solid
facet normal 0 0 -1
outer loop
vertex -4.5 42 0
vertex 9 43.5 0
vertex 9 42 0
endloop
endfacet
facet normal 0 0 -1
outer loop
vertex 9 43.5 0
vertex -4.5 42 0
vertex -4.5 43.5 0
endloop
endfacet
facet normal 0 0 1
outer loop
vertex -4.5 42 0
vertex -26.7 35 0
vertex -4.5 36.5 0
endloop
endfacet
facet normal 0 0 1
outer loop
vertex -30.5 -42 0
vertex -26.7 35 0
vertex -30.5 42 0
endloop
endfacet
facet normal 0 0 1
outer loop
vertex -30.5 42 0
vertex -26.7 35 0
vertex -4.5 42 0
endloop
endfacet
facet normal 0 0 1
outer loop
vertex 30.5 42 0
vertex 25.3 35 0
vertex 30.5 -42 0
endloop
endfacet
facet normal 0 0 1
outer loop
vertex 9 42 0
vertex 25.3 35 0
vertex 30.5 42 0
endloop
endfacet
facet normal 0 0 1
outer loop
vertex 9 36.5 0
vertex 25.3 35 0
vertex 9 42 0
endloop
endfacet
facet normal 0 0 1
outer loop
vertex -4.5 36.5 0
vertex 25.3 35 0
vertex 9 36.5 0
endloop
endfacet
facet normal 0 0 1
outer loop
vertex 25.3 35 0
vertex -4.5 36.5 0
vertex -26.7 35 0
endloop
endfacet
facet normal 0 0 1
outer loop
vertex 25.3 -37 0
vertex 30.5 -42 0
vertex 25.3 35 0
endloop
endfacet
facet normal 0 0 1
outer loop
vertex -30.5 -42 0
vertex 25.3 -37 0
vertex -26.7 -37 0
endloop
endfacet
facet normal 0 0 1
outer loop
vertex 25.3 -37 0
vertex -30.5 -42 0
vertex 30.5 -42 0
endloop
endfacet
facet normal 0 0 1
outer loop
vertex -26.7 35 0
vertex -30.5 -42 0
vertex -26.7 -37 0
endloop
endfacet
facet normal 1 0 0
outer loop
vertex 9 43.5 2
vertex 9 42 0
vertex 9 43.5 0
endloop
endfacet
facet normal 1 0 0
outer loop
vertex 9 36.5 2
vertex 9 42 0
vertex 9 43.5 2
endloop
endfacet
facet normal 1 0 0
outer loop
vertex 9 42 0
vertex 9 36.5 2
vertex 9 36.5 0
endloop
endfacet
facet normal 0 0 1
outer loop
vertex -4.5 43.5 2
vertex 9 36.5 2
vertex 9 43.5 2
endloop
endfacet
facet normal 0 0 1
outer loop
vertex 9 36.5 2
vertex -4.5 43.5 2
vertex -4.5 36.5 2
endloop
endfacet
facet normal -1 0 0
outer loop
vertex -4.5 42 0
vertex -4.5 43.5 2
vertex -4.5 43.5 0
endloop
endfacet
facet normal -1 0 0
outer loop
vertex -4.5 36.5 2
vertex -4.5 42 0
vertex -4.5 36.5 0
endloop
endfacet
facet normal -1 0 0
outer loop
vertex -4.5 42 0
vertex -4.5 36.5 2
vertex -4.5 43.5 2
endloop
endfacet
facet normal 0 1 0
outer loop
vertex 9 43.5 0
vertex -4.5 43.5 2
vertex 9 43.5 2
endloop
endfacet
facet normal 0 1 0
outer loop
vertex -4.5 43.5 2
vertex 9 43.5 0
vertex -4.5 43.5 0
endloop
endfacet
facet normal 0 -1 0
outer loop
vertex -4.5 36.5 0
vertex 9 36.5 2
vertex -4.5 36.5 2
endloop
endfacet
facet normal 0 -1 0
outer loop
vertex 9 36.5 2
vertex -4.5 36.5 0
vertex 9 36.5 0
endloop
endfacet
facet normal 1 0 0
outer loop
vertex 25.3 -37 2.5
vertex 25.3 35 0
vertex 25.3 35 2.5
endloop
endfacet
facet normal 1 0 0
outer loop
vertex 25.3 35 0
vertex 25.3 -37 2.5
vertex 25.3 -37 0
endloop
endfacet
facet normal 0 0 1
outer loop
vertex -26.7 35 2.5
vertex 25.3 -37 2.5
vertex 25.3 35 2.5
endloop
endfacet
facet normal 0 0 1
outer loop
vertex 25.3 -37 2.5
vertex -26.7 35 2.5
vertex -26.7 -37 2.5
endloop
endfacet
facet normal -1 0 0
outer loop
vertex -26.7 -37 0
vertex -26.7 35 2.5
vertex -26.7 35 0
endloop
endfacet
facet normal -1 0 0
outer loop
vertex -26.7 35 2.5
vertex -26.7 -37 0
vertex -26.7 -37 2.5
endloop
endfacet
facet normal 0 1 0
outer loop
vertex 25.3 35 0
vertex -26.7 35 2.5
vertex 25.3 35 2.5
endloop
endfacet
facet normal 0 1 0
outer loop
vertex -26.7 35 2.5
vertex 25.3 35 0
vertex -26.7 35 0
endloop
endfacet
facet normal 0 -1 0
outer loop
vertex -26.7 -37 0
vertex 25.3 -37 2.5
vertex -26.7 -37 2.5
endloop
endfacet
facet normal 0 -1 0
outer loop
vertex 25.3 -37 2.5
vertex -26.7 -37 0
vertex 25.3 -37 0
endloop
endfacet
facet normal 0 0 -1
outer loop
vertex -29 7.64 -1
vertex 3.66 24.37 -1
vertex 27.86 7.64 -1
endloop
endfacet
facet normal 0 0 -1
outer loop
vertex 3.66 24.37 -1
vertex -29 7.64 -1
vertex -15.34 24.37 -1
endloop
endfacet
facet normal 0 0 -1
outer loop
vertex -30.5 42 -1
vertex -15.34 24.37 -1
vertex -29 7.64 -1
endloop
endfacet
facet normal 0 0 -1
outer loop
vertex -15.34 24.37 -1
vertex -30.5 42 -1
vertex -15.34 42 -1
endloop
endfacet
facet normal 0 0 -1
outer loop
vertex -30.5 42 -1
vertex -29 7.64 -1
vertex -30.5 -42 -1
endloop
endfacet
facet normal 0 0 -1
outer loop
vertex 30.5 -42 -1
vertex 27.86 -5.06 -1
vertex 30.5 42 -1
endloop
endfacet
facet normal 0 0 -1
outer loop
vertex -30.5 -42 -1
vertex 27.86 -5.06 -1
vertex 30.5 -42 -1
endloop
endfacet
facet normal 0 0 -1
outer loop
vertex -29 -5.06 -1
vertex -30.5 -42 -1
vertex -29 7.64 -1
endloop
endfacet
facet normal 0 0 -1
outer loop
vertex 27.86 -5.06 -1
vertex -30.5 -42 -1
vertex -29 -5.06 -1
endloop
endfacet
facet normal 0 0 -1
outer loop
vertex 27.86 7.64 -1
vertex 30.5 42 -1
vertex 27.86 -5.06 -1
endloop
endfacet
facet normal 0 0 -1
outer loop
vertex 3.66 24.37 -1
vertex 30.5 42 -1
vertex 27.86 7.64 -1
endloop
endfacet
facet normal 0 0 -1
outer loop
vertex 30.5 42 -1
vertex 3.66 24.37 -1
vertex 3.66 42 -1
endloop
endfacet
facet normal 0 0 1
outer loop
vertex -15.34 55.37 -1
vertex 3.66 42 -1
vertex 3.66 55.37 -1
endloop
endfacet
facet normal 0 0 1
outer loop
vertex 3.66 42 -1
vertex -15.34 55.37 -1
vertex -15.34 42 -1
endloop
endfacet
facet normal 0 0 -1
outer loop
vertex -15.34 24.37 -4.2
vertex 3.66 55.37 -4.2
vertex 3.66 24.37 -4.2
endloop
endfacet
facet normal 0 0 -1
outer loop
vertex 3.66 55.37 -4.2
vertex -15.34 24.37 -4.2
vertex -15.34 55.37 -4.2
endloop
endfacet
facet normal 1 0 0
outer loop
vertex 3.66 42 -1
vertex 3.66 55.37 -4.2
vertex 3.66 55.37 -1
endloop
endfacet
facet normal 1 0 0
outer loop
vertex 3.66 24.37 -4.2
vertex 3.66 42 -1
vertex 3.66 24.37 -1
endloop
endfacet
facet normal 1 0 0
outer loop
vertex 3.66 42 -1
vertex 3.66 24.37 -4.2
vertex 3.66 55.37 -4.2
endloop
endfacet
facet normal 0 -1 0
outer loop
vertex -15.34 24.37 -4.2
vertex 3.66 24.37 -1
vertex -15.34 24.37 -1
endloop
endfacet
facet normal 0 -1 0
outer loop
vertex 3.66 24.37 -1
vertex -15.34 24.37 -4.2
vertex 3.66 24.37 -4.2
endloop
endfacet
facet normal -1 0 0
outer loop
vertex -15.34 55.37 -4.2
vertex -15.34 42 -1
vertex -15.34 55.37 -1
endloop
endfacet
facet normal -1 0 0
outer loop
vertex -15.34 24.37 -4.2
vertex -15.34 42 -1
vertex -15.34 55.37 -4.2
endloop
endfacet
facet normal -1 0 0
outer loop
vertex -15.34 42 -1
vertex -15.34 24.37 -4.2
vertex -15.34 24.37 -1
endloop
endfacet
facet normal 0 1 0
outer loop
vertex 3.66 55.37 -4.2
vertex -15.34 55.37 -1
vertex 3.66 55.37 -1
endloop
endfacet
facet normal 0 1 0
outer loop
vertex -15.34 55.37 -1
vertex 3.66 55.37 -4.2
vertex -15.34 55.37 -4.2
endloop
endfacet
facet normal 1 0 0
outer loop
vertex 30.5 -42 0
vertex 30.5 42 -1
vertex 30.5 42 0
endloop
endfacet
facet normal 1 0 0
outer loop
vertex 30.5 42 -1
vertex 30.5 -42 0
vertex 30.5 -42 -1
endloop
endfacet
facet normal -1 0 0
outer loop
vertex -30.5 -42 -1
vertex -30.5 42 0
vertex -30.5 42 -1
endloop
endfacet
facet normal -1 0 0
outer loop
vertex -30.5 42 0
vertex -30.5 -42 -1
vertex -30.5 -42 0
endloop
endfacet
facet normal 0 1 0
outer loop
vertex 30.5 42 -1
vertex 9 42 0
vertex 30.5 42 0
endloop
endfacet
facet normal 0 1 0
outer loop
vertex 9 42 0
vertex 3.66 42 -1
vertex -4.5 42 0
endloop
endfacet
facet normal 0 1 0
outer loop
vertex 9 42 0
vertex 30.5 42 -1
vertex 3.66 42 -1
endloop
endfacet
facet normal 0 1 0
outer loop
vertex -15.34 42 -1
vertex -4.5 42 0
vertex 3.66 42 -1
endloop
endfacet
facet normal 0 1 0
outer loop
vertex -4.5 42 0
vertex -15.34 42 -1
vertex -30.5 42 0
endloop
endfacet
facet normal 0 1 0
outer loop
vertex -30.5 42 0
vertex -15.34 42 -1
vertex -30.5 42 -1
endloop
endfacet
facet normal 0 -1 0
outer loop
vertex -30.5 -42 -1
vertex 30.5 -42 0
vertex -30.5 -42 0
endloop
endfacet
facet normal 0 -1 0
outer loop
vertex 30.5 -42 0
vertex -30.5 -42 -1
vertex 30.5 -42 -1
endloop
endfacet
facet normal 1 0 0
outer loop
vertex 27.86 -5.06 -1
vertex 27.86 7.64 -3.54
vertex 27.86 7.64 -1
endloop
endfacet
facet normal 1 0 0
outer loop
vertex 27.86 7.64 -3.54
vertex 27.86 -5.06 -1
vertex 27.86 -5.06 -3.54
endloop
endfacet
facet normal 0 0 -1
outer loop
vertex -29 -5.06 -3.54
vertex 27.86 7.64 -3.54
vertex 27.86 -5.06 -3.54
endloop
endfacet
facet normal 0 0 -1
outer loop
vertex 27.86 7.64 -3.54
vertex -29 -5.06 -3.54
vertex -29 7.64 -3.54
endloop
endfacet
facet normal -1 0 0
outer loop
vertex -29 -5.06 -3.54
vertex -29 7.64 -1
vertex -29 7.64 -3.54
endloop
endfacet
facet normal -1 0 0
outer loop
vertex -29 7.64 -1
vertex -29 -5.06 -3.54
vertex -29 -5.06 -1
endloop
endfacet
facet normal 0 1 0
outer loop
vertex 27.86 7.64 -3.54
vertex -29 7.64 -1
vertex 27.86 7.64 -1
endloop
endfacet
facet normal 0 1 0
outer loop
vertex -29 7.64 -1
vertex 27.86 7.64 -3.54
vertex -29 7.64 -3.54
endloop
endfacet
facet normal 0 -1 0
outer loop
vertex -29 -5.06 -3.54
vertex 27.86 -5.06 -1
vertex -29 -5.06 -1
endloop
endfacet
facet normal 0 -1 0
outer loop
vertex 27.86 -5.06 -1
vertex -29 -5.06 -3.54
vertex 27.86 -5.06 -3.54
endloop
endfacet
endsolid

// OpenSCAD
 // ILI9341 TFT LCD Module
 // the version, which was shipped from the ebay seller
 // Model Version ZH6 (?)
 
 union()
 {
     // board
     color("DarkRed", 1.0) translate([0,0,-0.5])
     cube([61,84,1.0], center=true);
     
     // push button K1
     translate([-1.5,38,0]) 
     {
         // case
         color("Silver", 1.0) cube([7.5,4,1.6], center=false);
         // button
         color("White", 1.0)  translate([(7.5-3.3)/2, (4-1.8)/2,0]) cube([3.3,1.8,1.8], center=false);
         // cut-out-box
         color("Red", 0.5)  translate([-3,-1.5,0]) cube([7.5+6,4+3,2.0], center=false);
         // silkscreen
         color("White", 1.0) translate([-10,-1.5,-0.49]) text("K1", size=4);
     }
     
     // TFT screen
     translate([-25.7,-36,0]) 
     {
         color("SlateGray", 1.0) cube([50,70,2.2], center=false);
         color("Red", 0.5) translate([-1, -1, 0]) cube([50+2,70+2,2.5], center=false);
     }
     
     
     // Pins
     translate([-29, -33, 0])
     {
         color("White", 1.0)
         {
             translate([55,44,-0.51]) rotate([180,0,0]) text("J1", size=2);
             translate([55,-2,-0.51]) rotate([180,0,0]) text("J2", size=2);
             translate([-1,-2,-0.51]) rotate([180,0,0]) text("J3", size=2);
             translate([-1,35,-0.51]) rotate([180,0,0]) text("J4", size=2);
         }
         
         pin(0,0*2.54,"n/c");
         pin(0,1*2.54,"LCD_RST");
         pin(0,2*2.54,"LCD_CS / Touch X-");
         pin(0,3*2.54,"LCD_RS / Touch Y+");
         pin(0,4*2.54,"LCD_WR");
         pin(0,5*2.54,"LCD_RD");
         
         pin(0,7*2.54,"n/c");
         pin(0,8*2.54,"GND");
         pin(0,9*2.54,"GND");
         pin(0,10*2.54,"5V");
         pin(0,11*2.54,"3V3");
         pin(0,12*2.54,"K1");
         
         translate([56.86, 0, 0])
         {
             pin(0,0*2.54,"n/c",true);
             pin(0,1*2.54,"n/c",true);
             pin(0,2*2.54,"LCD_D2",true);
             pin(0,3*2.54,"LCD_D3",true);
             pin(0,4*2.54,"LCD_D4",true);
             pin(0,5*2.54,"LCD_D5",true);
             pin(0,6*2.54,"LCD_D6",true);
             pin(0,7*2.54,"LCD_D7",true);
             
             translate([0, -1.016, 0]) // famous arduino header spacing error
             {
                 pin(0,9*2.54,"Touch Y- / LCD_D0",true);
                 pin(0,10*2.54,"Touch X+ / LCD_D1",true);
                 pin(0,11*2.54,"SD_SS",true);
                 pin(0,12*2.54,"SD_DI",true);
                 pin(0,13*2.54,"SD_DO",true);
                 pin(0,14*2.54,"SD_SCK",true);
                 pin(0,15*2.54,"n/c",true);
                 pin(0,16*2.54,"n/c",true);
             }
         }
     }
     
     
     // Micro Controller Chips
     translate([-29, -33+11*2.54, 0])
     color("Red", 0.5) translate([0, 0, -3.54]) cube([56.86,5*2.54,2.54], center=false);
     
     // SD Card Reader
     translate([-29, -33+3*2.54, 0]) 
     translate([14.66, 47.65+3.1, -4])
     {
         color("Silver", 1.0) difference()
         {
             linear_extrude(3) 
             polygon([ [0,0], [17,0], [17,16.65], [12,16.65], [10,16.0], [0,16.0]]);
             
             translate([0,1,0.5]) linear_extrude(2) 
             polygon([ [1,0], [16,0], [16,16.65], [12,16.65], [10,16.0], [1,16.0]]);
         };
         
         color("Red", 0.5) translate([0,0,-0.2]) linear_extrude(3.2) 
         polygon([ [-1,-1], [18,-1], [18,30], [-1,30]]);
         
         color("Black", 1.0) translate([1,10,0]) rotate([180,0,0]) text("SD card", size=3);
     }

 }
 
 
 module pin(x=0.0, y=0.0, desc="", mirror=false)
 {
     translate([x,y,0])
     {
        color("Goldenrod", 1.0) translate([0, 0, -11.33/2+2.46]) cube([0.65,0.65,11.33], center=true);
        color("Black", 1.0)     translate([0, 0, -1-2.54/2])     cube([2.54,2.54,2.54], center=true); 
        color("Red", 0.5)       translate([0, 0, -7.3])          cube([3,3,20], center=true);
         
        if (mirror) color("White", 1.0) translate([-2,1,-0.51]) rotate([180,0,0]) text(desc, size=1.5, halign="right");
        else        color("White", 1.0) translate([2,1,-0.51])   rotate([180,0,0]) text(desc, size=1.5);
         
     }
 }
